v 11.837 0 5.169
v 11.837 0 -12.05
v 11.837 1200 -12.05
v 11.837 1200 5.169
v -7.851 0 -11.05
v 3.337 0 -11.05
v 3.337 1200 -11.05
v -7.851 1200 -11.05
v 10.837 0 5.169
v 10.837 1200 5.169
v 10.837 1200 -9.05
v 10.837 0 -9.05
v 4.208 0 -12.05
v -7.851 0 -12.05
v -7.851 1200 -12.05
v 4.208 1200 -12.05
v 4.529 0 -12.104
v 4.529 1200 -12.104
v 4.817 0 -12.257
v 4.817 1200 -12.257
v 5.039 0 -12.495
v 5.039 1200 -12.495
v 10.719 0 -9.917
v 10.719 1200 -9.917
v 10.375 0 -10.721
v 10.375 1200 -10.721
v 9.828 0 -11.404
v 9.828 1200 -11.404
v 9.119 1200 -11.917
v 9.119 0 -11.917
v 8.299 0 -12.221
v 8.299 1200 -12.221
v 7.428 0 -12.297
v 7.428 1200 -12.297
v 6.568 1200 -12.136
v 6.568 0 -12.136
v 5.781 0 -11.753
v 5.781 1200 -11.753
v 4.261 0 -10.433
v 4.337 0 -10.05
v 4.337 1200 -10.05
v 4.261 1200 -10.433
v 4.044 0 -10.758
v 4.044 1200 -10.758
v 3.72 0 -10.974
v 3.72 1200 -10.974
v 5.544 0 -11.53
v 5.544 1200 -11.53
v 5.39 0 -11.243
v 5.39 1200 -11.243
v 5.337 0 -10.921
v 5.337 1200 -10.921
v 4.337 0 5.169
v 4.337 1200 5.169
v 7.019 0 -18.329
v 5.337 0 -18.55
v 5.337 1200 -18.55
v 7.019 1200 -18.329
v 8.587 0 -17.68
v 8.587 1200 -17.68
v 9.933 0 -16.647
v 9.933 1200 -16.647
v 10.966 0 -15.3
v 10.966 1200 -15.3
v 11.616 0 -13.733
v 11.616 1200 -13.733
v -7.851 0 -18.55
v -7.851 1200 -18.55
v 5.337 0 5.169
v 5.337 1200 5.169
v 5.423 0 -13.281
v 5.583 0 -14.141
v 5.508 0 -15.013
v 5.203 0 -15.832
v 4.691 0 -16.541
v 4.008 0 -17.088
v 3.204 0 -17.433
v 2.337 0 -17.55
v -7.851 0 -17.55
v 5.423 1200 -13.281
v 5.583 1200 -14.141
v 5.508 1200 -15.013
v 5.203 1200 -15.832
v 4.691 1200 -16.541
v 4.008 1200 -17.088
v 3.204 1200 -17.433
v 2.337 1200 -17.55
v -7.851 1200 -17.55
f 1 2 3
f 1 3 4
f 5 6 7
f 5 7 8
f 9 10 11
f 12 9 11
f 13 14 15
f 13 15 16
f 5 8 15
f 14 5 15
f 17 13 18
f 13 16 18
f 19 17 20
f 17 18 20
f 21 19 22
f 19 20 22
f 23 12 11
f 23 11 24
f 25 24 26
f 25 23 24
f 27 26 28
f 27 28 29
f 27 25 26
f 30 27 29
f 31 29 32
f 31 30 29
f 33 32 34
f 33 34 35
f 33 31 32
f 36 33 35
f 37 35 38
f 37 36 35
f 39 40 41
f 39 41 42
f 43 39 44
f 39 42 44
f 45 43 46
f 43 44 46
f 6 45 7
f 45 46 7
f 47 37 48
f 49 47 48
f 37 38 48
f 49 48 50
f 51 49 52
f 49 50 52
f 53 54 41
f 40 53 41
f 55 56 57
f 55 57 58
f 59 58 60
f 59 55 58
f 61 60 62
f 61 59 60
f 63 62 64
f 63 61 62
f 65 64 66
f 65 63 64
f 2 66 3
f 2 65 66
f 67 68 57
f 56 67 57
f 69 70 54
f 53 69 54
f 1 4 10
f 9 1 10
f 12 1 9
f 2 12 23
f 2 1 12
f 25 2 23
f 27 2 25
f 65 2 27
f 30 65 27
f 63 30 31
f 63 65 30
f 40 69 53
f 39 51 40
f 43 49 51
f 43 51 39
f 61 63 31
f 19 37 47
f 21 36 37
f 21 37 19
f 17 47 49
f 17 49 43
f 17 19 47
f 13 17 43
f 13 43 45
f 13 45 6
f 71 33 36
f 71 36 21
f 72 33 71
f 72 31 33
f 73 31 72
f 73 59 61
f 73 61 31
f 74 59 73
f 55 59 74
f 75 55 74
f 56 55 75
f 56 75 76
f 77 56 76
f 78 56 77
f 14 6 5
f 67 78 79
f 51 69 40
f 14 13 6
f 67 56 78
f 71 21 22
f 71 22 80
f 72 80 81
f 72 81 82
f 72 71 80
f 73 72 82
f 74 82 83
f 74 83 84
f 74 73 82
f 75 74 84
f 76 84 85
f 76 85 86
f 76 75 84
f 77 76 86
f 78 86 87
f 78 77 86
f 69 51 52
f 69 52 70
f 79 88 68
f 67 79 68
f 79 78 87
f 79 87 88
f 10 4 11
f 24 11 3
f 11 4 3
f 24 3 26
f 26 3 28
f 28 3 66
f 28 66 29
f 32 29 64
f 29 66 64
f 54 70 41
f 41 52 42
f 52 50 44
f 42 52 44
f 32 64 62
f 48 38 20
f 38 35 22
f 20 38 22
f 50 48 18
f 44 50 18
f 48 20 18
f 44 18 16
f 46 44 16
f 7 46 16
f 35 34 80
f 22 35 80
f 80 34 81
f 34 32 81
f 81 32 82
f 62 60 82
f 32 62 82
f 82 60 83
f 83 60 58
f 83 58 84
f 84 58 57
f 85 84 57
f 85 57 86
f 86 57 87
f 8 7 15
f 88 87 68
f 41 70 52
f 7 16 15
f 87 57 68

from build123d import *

# Parameters (mm, degrees)
EXTRUDE_1_DEPTH = 1200
FILLET_1_R      = 1


with BuildPart() as part:
    # Sketch 1 → Extrude 1 (new body)
    with BuildSketch(Plane(origin=(0, 0, 0), x_dir=(1, 0, 0), z_dir=(0, 1, 0))):
        with BuildLine():
            Line((2.337006084, 17.550433348), (-7.851124943, 17.550433348))
            Line((-7.851124943, 17.550433348), (-7.851124943, 18.550433348))
            Line((-7.851124943, 18.550433348), (5.337006084, 18.550433348))
            ThreePointArc((5.337006084, 18.550433348), (9.933200162, 16.646627425), (11.837006084, 12.050433348))
            Line((11.837006084, 12.050433348), (11.837006084, -5.16889475))
            Line((11.837006084, -5.16889475), (10.837006084, -5.16889475))
            Line((10.837006084, -5.16889475), (10.837006084, 9.050433348))
            ThreePointArc((10.837006084, 9.050433348), (8.861760963, 12.039998533), (5.337006084, 11.395641227))
            Line((5.337006084, 11.395641227), (5.337006084, -5.16889475))
            Line((5.337006084, -5.16889475), (4.337006084, -5.16889475))
            Line((4.337006084, -5.16889475), (4.337006084, 11.050433348))
            Line((4.337006084, 11.050433348), (-7.851124943, 11.050433348))
            Line((-7.851124943, 11.050433348), (-7.851124943, 12.050433348))
            Line((-7.851124943, 12.050433348), (4.682213964, 12.050433348))
            ThreePointArc((4.682213964, 12.050433348), (5.32657127, 15.575188226), (2.337006084, 17.550433348))
        make_face()
    extrude(amount=EXTRUDE_1_DEPTH)

    # Fillet 1
    fillet_1_edges = [part.edges().sort_by_distance(p)[0] for p in [
        (5.337006084, 600, -11.395641227),
        (4.337006084, 600, -11.050433348),
        (4.682213964, 600, -12.050433348),
    ]]
    fillet(fillet_1_edges, radius=FILLET_1_R)


solid = part.part
